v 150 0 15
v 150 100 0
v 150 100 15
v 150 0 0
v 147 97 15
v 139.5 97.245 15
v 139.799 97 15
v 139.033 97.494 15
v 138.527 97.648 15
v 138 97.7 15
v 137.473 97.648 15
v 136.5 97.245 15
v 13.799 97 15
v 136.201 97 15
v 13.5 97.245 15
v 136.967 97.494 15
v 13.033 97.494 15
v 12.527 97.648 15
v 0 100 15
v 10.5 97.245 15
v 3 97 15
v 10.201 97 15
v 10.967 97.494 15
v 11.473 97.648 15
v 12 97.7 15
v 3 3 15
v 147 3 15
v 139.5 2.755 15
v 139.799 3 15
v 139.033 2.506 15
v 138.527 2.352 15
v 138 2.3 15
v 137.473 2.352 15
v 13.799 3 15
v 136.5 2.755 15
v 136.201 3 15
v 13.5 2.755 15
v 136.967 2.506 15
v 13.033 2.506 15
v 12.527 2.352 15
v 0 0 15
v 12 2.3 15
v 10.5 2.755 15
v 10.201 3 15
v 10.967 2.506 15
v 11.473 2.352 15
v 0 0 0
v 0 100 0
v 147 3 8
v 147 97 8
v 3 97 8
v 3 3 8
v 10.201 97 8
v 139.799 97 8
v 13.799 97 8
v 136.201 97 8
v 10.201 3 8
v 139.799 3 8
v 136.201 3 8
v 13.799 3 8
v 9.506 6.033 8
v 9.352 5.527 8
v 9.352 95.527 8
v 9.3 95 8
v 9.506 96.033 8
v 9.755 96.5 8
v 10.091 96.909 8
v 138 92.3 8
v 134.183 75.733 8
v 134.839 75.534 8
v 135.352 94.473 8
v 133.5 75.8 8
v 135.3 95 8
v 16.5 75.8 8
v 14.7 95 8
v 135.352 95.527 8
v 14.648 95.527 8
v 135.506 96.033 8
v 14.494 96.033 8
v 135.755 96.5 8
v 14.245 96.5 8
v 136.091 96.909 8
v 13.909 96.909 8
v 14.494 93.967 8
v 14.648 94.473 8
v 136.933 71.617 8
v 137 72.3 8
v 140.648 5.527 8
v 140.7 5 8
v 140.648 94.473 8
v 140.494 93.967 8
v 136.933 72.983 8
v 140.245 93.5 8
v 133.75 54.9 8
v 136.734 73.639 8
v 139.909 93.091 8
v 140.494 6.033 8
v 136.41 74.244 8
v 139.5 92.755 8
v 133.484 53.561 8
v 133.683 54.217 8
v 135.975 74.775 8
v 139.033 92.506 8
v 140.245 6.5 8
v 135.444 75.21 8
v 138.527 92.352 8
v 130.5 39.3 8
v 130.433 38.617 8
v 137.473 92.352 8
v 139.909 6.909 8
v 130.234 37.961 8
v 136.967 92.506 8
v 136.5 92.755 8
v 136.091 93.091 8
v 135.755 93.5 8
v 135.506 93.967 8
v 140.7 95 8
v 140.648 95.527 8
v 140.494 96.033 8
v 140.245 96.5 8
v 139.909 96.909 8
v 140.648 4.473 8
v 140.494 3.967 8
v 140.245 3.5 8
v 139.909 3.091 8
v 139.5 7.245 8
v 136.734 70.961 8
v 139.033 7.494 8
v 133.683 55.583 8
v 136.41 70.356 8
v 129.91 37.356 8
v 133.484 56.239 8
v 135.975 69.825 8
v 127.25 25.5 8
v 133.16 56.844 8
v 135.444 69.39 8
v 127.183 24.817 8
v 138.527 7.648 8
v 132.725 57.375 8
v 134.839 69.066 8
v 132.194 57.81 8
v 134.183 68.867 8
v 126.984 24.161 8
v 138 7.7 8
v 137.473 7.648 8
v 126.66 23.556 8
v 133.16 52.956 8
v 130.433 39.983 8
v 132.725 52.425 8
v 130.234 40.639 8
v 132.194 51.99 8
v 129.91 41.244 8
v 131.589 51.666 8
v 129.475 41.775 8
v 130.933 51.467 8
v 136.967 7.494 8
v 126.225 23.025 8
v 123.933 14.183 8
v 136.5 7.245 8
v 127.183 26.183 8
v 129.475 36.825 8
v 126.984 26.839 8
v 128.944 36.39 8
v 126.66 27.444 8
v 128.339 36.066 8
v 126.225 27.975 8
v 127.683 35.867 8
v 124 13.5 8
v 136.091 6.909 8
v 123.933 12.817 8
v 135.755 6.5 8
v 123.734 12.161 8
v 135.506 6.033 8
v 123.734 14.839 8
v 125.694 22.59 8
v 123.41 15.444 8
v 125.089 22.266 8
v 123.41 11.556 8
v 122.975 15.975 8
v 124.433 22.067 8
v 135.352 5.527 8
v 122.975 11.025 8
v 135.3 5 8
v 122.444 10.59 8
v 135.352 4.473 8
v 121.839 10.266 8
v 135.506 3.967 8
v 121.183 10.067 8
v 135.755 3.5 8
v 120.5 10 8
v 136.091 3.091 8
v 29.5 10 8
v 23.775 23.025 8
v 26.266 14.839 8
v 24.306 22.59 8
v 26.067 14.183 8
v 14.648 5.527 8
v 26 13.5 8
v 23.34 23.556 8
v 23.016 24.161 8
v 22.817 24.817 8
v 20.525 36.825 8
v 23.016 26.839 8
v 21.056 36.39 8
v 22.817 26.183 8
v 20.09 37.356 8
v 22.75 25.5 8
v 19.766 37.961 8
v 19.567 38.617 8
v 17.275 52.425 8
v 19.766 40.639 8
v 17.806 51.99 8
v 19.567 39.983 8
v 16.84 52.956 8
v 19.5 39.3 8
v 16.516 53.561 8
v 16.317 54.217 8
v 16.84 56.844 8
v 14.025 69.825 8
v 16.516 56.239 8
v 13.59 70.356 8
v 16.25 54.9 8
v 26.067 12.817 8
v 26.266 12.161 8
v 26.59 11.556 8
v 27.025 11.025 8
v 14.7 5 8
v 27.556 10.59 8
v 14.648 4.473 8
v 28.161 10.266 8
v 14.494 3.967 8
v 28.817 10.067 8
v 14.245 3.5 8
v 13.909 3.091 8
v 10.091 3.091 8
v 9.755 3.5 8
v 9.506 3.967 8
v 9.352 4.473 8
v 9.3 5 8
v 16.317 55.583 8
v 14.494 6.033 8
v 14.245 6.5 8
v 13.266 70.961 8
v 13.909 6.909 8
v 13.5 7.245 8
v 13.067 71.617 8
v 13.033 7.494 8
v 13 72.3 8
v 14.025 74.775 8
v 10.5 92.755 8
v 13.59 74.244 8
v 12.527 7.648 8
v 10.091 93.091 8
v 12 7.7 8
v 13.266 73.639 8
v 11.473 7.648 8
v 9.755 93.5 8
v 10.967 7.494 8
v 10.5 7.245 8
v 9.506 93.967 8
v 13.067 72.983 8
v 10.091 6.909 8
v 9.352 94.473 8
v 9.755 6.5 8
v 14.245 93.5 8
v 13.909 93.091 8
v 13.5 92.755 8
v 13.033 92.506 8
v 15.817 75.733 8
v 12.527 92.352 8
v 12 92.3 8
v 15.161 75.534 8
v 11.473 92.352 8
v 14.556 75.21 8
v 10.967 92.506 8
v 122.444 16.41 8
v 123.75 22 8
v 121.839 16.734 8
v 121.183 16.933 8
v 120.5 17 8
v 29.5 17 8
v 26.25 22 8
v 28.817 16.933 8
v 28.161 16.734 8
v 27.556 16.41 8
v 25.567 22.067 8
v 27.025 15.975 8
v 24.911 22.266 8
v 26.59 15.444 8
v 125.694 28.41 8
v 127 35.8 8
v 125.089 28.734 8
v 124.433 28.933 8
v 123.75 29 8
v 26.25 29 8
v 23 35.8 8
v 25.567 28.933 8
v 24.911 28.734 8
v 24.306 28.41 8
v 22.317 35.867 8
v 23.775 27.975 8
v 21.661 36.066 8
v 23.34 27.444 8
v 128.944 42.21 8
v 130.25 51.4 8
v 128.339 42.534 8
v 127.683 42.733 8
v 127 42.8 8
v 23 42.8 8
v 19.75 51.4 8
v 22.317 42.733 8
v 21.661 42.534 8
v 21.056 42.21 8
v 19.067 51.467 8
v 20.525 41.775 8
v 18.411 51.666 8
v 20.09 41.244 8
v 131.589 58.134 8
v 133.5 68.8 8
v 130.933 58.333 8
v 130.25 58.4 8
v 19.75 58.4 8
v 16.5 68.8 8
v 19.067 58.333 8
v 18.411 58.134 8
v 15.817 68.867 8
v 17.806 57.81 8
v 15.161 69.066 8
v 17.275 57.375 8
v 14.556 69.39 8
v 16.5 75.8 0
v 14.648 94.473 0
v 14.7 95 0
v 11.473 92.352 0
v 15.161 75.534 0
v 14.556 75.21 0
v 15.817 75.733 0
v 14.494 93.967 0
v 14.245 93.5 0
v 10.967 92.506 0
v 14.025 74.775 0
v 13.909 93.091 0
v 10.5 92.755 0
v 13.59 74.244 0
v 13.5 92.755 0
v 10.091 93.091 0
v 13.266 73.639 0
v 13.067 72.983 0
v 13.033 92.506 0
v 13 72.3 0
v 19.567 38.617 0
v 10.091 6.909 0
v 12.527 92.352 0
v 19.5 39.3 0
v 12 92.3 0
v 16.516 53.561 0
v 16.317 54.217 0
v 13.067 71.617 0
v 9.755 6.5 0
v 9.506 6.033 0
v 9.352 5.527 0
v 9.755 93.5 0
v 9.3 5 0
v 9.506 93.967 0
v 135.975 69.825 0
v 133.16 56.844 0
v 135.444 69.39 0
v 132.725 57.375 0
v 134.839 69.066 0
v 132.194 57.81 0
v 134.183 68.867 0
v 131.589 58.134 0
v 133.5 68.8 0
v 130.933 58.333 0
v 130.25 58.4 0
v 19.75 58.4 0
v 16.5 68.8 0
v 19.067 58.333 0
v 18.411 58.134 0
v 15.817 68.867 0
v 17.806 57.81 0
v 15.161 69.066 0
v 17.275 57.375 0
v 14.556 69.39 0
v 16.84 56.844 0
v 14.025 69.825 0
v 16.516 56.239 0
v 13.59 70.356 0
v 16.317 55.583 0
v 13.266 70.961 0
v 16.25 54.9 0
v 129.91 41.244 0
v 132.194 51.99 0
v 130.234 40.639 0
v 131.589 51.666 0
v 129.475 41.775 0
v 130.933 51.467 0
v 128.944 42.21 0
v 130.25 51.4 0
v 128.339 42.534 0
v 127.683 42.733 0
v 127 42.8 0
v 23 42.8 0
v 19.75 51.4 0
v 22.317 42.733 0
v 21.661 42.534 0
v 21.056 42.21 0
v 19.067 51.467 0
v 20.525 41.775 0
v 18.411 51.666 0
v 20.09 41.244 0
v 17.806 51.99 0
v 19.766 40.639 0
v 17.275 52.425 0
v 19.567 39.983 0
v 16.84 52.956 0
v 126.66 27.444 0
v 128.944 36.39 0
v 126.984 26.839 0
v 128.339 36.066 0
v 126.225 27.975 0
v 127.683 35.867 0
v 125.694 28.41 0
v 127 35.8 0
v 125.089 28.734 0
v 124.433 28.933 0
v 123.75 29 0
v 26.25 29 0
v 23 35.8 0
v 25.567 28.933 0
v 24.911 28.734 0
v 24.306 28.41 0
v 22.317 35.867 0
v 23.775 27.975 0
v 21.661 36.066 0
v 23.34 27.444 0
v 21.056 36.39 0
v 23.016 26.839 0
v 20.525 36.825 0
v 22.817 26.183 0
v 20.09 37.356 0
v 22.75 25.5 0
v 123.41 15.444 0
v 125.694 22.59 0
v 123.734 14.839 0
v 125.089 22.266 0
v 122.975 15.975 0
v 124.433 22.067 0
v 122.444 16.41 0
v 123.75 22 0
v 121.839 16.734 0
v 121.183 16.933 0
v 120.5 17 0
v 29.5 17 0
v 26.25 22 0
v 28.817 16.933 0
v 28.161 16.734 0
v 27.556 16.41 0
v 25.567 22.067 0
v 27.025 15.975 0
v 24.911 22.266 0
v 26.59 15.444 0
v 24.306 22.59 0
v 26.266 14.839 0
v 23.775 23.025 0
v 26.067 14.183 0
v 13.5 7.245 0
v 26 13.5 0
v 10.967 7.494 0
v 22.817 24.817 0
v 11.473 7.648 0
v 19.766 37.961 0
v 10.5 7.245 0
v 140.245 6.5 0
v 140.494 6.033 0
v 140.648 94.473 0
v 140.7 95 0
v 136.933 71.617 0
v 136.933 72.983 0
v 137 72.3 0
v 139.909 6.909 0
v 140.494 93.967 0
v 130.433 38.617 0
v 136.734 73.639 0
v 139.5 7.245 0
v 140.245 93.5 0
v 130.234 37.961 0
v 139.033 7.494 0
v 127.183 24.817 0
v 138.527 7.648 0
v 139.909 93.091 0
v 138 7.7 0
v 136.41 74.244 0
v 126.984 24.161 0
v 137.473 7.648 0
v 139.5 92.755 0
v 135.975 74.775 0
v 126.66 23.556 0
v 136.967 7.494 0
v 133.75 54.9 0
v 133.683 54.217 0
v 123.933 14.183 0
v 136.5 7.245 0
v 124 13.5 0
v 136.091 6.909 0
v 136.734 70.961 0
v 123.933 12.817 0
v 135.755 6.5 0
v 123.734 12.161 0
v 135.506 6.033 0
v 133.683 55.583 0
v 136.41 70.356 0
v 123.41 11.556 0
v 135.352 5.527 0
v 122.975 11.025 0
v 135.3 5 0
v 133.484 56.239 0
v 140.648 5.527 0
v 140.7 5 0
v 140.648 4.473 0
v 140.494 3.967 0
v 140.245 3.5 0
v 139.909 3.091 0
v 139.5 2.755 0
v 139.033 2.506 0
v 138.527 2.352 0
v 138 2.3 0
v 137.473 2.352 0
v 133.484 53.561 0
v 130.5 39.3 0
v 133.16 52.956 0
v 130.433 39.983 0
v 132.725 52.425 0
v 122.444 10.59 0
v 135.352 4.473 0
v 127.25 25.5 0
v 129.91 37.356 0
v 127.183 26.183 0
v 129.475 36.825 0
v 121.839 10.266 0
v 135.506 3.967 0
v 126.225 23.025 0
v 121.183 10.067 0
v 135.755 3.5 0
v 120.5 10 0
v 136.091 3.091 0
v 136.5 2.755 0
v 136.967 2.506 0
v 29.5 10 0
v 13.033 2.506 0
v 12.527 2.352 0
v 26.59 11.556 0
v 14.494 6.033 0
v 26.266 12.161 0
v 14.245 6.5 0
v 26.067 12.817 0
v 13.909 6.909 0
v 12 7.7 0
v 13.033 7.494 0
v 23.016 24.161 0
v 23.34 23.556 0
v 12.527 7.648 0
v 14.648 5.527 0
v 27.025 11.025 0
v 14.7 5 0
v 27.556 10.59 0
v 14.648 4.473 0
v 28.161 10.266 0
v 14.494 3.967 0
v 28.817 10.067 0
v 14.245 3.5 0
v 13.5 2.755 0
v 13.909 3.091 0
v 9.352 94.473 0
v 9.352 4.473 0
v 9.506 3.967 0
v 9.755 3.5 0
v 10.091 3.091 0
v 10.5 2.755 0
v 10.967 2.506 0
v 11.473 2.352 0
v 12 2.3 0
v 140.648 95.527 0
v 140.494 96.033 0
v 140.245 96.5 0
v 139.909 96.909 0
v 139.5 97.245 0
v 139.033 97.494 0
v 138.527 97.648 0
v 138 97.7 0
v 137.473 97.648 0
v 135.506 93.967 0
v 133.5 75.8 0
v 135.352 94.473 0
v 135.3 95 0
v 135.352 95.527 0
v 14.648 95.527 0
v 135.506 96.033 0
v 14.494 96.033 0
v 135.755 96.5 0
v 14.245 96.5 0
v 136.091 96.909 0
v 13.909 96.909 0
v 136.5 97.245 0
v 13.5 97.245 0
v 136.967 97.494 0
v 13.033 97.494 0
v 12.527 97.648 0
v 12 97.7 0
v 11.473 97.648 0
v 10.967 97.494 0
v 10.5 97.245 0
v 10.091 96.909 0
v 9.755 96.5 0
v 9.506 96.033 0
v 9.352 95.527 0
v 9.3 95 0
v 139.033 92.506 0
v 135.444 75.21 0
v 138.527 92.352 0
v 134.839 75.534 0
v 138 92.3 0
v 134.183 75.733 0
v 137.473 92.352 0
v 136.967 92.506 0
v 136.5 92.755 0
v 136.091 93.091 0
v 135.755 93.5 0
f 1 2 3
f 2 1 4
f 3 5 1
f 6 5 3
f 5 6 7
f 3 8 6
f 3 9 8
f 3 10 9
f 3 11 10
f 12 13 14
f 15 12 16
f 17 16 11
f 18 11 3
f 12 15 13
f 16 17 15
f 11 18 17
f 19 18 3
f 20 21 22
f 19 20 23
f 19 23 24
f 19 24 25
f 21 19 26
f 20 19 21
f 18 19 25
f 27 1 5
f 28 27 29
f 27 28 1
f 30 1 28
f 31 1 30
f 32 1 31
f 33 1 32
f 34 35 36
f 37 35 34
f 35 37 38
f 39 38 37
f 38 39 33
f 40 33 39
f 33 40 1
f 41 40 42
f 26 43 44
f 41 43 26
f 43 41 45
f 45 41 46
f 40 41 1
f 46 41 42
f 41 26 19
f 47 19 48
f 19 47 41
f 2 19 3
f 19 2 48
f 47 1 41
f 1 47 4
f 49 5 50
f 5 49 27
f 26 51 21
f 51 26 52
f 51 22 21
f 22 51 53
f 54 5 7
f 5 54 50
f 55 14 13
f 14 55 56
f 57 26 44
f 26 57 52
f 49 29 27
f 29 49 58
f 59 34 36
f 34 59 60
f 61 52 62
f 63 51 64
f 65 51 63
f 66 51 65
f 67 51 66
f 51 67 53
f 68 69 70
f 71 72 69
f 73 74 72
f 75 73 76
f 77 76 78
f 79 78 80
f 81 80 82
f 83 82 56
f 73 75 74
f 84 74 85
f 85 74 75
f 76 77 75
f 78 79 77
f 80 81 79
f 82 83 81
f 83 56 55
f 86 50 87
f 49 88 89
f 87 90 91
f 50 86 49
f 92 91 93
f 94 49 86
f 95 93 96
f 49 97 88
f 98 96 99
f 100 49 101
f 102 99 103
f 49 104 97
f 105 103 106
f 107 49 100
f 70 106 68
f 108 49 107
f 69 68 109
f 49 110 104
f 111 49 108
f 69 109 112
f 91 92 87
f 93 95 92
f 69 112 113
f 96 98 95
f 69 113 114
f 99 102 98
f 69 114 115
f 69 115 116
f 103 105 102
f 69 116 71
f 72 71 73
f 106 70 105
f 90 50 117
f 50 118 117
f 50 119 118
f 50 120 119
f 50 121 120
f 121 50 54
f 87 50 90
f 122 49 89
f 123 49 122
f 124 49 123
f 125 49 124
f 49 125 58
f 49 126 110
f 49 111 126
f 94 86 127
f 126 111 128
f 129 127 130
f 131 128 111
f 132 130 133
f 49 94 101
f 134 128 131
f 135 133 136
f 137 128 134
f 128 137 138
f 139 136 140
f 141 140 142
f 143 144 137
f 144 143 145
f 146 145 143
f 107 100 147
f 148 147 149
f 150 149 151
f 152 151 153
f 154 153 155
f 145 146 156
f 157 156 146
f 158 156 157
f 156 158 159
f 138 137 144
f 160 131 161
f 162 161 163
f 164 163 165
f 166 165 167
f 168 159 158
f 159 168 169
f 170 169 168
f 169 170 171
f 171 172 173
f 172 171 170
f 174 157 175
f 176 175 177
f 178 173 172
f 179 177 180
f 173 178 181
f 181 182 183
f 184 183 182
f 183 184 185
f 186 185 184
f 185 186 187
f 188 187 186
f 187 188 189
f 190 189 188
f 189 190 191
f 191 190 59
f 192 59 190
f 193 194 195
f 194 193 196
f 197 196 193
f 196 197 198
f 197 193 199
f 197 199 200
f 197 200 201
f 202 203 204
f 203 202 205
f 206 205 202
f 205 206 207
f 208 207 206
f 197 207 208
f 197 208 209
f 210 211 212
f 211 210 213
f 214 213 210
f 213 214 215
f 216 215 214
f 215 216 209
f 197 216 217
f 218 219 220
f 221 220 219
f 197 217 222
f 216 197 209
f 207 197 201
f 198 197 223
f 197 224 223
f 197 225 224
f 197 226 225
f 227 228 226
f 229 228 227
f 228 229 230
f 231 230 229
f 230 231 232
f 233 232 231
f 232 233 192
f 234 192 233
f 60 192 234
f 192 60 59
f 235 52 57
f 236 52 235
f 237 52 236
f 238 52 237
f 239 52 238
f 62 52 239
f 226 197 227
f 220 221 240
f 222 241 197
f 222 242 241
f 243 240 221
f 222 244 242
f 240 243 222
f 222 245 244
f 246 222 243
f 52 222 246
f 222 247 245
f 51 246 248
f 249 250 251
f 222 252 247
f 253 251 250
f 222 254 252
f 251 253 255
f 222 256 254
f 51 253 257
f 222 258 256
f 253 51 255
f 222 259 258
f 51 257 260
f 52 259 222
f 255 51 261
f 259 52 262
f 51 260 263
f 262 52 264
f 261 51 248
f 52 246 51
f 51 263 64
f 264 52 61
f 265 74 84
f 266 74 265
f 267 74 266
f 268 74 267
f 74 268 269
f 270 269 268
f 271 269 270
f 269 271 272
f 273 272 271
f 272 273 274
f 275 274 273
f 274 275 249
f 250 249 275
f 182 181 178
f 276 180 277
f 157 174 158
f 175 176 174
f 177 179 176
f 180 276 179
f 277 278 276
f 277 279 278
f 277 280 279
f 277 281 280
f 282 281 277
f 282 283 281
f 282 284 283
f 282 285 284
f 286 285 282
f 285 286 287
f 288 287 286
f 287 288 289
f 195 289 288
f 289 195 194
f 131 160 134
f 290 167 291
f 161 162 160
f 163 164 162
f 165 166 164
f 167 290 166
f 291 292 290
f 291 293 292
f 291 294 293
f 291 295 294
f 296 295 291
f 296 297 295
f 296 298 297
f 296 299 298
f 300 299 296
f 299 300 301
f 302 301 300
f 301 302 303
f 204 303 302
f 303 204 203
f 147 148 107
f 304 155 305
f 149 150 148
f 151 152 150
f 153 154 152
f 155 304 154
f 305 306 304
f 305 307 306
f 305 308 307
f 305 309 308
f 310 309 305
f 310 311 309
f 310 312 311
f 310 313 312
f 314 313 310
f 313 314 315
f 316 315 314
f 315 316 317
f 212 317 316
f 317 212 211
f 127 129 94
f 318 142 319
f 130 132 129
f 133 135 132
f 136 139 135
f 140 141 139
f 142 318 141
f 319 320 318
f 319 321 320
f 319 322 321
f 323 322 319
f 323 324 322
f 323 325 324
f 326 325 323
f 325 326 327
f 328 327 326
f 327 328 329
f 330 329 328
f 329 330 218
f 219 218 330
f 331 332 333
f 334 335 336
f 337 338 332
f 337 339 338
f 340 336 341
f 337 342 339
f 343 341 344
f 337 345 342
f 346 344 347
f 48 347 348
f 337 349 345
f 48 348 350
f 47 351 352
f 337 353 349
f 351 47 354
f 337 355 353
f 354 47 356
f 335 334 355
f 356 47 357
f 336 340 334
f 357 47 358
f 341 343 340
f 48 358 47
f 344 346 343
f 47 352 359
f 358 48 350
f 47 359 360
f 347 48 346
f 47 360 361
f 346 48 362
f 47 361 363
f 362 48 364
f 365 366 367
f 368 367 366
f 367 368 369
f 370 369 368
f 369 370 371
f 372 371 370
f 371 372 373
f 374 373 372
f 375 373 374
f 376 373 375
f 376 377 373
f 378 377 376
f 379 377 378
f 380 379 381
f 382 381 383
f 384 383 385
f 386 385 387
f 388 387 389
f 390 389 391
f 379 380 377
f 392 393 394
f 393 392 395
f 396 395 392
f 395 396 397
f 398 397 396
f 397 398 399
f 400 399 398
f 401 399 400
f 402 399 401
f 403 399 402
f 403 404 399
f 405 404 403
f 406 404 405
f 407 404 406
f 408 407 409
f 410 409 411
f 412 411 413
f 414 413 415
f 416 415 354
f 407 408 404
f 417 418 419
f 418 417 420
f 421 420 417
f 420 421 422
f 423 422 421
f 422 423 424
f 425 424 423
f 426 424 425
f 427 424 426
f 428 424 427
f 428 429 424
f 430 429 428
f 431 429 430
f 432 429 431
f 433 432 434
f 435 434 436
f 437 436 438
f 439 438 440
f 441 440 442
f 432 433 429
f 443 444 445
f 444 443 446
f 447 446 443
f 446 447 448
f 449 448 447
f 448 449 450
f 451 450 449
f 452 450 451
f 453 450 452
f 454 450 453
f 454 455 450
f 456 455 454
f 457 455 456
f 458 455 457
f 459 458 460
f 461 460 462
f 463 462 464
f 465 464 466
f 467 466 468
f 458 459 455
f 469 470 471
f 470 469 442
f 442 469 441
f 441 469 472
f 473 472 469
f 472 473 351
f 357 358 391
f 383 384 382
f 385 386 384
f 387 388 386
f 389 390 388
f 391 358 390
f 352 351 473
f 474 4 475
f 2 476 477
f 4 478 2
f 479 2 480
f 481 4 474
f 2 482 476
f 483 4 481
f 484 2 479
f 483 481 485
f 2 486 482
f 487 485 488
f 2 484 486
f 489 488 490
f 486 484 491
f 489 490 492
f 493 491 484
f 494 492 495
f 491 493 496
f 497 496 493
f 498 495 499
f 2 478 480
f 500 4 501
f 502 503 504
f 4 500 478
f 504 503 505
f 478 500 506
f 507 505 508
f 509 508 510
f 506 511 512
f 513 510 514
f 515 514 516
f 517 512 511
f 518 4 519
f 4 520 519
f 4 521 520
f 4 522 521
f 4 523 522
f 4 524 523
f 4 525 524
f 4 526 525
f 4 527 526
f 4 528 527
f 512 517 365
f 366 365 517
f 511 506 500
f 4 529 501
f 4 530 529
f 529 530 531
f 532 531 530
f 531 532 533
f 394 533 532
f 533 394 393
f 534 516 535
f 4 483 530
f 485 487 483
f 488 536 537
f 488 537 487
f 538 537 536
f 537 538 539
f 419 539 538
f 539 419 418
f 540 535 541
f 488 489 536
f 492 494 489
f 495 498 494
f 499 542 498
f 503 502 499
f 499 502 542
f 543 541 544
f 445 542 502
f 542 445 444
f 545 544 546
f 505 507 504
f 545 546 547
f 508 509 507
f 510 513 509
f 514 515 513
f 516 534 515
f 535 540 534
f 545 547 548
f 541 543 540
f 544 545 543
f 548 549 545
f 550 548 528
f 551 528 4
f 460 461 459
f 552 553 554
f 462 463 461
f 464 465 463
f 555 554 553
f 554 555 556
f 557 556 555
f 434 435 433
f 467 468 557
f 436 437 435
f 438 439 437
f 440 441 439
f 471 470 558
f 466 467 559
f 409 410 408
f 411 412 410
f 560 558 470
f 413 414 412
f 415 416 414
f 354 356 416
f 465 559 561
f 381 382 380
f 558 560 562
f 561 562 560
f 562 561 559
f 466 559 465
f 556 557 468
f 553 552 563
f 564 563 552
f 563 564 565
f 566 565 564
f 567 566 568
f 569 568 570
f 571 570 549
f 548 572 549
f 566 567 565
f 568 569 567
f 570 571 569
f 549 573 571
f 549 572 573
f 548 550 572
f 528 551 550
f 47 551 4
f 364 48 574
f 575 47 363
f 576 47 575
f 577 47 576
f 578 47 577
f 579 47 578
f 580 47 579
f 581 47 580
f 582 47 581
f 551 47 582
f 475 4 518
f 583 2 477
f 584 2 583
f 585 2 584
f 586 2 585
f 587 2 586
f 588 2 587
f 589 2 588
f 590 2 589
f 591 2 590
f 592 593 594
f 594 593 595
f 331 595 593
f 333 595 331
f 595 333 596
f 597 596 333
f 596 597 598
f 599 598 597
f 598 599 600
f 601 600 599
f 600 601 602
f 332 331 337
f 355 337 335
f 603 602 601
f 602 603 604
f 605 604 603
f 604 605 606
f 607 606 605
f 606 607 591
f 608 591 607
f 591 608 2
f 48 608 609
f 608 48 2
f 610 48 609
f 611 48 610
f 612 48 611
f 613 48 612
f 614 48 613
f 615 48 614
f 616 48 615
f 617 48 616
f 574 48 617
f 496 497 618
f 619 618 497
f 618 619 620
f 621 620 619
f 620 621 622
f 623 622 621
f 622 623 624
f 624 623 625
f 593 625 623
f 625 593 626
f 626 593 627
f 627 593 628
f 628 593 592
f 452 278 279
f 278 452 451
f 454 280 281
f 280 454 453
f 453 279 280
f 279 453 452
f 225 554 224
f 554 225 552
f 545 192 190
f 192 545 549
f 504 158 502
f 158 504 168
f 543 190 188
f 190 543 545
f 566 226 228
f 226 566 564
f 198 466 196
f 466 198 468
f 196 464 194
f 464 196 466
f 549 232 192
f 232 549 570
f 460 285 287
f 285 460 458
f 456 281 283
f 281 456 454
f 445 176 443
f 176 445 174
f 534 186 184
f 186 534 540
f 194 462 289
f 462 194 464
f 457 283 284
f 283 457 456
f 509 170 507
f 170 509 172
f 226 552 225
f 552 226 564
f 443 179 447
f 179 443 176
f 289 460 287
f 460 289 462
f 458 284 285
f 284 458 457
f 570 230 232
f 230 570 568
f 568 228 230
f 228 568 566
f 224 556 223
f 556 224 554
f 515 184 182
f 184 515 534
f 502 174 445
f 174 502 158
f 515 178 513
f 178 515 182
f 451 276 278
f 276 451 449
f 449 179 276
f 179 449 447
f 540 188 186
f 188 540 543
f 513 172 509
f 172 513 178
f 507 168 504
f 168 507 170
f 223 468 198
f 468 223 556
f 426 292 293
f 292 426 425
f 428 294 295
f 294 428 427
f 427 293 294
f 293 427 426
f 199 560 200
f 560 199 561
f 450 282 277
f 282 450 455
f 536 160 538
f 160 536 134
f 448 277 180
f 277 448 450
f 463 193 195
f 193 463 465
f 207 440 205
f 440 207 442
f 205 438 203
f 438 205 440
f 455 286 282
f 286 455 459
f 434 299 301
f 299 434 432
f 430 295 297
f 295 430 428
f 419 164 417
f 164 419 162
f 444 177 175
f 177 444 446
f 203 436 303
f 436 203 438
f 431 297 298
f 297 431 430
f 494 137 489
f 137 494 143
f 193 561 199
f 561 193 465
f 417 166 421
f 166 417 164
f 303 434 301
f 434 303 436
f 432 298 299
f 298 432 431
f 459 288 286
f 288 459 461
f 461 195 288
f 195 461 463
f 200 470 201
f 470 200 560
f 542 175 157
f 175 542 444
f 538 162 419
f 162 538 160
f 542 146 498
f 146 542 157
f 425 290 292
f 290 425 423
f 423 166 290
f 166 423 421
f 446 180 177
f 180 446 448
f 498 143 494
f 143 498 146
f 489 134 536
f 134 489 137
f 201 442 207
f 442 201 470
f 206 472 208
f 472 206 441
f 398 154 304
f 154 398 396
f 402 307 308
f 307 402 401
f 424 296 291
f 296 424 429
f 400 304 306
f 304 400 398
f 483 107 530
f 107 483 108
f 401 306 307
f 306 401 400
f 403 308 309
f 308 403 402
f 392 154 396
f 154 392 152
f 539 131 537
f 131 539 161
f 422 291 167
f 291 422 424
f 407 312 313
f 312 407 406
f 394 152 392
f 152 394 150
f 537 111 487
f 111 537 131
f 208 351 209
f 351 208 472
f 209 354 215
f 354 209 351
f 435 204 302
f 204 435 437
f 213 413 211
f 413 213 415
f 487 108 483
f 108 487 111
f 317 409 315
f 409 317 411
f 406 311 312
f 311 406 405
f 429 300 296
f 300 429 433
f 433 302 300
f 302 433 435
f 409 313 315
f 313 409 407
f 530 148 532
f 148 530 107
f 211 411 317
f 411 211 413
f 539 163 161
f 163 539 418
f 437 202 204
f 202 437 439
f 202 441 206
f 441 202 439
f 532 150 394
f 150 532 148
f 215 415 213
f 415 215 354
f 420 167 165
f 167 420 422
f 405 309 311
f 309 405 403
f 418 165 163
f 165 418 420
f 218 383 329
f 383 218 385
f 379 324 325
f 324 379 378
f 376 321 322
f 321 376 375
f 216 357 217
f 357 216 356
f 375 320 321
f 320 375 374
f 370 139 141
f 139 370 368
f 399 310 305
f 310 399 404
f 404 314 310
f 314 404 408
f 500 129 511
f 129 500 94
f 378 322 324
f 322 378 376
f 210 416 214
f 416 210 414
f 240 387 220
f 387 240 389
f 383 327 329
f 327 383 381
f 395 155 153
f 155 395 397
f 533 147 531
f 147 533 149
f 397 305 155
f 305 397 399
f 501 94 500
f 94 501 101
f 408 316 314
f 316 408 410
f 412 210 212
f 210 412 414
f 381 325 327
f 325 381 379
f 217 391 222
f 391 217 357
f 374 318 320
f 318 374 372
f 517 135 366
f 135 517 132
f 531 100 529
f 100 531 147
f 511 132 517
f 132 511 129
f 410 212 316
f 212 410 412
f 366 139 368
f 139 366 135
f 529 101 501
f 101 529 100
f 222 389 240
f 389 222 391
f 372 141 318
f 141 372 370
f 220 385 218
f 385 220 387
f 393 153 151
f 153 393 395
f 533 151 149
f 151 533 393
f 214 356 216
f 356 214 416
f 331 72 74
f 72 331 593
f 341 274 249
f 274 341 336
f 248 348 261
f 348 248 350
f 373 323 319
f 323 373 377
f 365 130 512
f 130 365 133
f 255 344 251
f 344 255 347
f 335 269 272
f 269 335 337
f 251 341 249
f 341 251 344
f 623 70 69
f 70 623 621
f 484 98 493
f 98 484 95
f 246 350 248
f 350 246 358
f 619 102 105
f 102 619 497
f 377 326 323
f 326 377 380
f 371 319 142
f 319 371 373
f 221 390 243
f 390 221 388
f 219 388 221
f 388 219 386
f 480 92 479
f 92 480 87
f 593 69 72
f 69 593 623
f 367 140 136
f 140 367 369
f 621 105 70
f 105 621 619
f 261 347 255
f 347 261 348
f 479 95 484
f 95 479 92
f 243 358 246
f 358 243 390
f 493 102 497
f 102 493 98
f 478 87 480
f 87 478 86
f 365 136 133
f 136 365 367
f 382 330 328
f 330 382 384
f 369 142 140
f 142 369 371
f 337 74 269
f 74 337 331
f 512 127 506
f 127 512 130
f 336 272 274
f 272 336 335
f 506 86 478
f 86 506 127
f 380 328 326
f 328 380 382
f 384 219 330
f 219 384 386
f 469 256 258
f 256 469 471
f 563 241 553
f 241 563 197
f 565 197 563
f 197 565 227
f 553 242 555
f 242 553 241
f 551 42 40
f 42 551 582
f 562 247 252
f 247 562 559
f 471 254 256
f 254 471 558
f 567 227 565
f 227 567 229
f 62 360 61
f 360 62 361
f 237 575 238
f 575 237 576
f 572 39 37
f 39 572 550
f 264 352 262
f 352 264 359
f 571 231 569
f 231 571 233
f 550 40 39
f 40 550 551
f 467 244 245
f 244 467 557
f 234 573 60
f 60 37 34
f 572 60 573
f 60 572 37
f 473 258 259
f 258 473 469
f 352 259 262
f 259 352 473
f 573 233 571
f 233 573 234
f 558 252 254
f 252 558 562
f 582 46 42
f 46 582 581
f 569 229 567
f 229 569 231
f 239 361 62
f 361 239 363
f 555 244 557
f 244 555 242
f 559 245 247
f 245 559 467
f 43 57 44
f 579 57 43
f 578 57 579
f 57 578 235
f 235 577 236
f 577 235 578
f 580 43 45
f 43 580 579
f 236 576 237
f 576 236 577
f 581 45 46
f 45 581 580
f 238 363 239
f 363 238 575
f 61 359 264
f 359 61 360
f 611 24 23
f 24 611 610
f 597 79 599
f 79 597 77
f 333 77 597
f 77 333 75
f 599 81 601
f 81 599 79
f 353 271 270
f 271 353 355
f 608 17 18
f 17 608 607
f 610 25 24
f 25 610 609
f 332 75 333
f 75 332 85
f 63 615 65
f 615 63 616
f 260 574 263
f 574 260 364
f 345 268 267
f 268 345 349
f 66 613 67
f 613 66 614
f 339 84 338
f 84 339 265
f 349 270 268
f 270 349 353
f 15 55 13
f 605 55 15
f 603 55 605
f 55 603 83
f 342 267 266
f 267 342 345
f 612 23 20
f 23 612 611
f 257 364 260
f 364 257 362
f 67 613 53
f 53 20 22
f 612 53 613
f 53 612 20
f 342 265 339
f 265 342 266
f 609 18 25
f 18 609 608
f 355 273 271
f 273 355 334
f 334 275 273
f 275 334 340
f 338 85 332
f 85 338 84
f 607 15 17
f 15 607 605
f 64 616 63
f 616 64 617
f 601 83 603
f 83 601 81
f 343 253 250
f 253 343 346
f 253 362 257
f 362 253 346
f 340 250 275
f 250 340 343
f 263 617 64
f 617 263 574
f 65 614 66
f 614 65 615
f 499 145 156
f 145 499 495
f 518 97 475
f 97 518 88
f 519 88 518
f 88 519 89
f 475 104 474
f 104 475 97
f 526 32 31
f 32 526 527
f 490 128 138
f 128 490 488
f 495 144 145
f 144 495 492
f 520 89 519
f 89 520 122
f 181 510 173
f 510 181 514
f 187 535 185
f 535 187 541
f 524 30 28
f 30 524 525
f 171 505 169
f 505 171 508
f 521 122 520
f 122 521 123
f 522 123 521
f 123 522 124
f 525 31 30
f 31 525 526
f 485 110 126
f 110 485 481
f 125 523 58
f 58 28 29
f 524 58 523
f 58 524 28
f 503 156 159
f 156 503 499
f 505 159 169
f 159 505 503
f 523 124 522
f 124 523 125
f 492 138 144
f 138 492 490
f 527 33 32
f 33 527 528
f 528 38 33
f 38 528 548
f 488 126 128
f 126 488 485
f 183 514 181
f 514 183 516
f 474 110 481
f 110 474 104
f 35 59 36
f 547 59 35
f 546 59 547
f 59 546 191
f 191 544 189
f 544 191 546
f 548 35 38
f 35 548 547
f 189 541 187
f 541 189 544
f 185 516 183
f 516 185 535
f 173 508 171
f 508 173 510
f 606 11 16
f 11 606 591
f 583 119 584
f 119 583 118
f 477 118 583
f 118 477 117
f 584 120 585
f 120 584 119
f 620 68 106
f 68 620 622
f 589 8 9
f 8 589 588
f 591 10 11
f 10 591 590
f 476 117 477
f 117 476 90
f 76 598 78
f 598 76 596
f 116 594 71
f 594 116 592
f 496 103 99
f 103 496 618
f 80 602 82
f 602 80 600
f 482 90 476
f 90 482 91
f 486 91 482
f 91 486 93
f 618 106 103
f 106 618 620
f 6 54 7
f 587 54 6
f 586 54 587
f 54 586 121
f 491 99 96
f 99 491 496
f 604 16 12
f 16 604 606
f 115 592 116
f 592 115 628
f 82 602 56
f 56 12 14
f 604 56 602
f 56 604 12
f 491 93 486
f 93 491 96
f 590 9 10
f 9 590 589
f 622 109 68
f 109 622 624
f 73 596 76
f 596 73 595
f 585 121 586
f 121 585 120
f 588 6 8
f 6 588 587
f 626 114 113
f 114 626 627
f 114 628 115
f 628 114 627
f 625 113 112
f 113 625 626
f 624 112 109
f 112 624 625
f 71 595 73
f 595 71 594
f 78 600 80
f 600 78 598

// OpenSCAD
$fn = 32;

// ----------------------------------------------------------------------
// Slotted panel: 150 x 100 mm, 5 рядов of slots
// ----------------------------------------------------------------------

// --- parameters (mm) ---
panel_w = 150;            // panel width
panel_d = 100;            // panel depth
thick = 8;                // panel thickness
slot_w = 7;               // slot width
pitch0 = 12;              // first row pitch
pitch_step = 1.8;         // pitch increase per row
margin = 10;              // margin around the slot field
rows = 5;                 // number of slot rows
mount_d = 5.4;            // mounting holes
mount_x = 63;             // mounting hole offset
rim_h = 15;               // rim height
rim_t = 3;                // rim wall thickness

difference() {
  union() {
    cube([panel_w, panel_d, thick]);
    translate([0, 0, thick - 1]) difference() {
      cube([panel_w, panel_d, rim_h - thick + 1]);
      translate([rim_t, rim_t, -2.5]) cube([panel_w - 2 * rim_t, panel_d - 2 * rim_t, rim_h - thick + 6]);
    }
  }
  /* slot rows: stadium shaped cutters, 2.5 mm clear of both faces */
  /* row 0: pitch 12, length 91 */
  hull() {
    translate([29.5, 13.5, -2.5]) cylinder(h = thick + 5, d = slot_w);
    translate([120.5, 13.5, -2.5]) cylinder(h = thick + 5, d = slot_w);
  }
  /* row 1: pitch 13.8, length 97.5 */
  hull() {
    translate([26.25, 25.5, -2.5]) cylinder(h = thick + 5, d = slot_w);
    translate([123.75, 25.5, -2.5]) cylinder(h = thick + 5, d = slot_w);
  }
  /* row 2: pitch 15.6, length 104 */
  hull() {
    translate([23, 39.3, -2.5]) cylinder(h = thick + 5, d = slot_w);
    translate([127, 39.3, -2.5]) cylinder(h = thick + 5, d = slot_w);
  }
  /* row 3: pitch 17.4, length 110.5 */
  hull() {
    translate([19.75, 54.9, -2.5]) cylinder(h = thick + 5, d = slot_w);
    translate([130.25, 54.9, -2.5]) cylinder(h = thick + 5, d = slot_w);
  }
  /* row 4: pitch 19.2, length 117 */
  hull() {
    translate([16.5, 72.3, -2.5]) cylinder(h = thick + 5, d = slot_w);
    translate([133.5, 72.3, -2.5]) cylinder(h = thick + 5, d = slot_w);
  }
  translate([12, 5, -2.5]) cylinder(h = 20, d = mount_d);
  translate([12, 95, -2.5]) cylinder(h = 20, d = mount_d);
  translate([138, 5, -2.5]) cylinder(h = 20, d = mount_d);
  translate([138, 95, -2.5]) cylinder(h = 20, d = mount_d);
}
